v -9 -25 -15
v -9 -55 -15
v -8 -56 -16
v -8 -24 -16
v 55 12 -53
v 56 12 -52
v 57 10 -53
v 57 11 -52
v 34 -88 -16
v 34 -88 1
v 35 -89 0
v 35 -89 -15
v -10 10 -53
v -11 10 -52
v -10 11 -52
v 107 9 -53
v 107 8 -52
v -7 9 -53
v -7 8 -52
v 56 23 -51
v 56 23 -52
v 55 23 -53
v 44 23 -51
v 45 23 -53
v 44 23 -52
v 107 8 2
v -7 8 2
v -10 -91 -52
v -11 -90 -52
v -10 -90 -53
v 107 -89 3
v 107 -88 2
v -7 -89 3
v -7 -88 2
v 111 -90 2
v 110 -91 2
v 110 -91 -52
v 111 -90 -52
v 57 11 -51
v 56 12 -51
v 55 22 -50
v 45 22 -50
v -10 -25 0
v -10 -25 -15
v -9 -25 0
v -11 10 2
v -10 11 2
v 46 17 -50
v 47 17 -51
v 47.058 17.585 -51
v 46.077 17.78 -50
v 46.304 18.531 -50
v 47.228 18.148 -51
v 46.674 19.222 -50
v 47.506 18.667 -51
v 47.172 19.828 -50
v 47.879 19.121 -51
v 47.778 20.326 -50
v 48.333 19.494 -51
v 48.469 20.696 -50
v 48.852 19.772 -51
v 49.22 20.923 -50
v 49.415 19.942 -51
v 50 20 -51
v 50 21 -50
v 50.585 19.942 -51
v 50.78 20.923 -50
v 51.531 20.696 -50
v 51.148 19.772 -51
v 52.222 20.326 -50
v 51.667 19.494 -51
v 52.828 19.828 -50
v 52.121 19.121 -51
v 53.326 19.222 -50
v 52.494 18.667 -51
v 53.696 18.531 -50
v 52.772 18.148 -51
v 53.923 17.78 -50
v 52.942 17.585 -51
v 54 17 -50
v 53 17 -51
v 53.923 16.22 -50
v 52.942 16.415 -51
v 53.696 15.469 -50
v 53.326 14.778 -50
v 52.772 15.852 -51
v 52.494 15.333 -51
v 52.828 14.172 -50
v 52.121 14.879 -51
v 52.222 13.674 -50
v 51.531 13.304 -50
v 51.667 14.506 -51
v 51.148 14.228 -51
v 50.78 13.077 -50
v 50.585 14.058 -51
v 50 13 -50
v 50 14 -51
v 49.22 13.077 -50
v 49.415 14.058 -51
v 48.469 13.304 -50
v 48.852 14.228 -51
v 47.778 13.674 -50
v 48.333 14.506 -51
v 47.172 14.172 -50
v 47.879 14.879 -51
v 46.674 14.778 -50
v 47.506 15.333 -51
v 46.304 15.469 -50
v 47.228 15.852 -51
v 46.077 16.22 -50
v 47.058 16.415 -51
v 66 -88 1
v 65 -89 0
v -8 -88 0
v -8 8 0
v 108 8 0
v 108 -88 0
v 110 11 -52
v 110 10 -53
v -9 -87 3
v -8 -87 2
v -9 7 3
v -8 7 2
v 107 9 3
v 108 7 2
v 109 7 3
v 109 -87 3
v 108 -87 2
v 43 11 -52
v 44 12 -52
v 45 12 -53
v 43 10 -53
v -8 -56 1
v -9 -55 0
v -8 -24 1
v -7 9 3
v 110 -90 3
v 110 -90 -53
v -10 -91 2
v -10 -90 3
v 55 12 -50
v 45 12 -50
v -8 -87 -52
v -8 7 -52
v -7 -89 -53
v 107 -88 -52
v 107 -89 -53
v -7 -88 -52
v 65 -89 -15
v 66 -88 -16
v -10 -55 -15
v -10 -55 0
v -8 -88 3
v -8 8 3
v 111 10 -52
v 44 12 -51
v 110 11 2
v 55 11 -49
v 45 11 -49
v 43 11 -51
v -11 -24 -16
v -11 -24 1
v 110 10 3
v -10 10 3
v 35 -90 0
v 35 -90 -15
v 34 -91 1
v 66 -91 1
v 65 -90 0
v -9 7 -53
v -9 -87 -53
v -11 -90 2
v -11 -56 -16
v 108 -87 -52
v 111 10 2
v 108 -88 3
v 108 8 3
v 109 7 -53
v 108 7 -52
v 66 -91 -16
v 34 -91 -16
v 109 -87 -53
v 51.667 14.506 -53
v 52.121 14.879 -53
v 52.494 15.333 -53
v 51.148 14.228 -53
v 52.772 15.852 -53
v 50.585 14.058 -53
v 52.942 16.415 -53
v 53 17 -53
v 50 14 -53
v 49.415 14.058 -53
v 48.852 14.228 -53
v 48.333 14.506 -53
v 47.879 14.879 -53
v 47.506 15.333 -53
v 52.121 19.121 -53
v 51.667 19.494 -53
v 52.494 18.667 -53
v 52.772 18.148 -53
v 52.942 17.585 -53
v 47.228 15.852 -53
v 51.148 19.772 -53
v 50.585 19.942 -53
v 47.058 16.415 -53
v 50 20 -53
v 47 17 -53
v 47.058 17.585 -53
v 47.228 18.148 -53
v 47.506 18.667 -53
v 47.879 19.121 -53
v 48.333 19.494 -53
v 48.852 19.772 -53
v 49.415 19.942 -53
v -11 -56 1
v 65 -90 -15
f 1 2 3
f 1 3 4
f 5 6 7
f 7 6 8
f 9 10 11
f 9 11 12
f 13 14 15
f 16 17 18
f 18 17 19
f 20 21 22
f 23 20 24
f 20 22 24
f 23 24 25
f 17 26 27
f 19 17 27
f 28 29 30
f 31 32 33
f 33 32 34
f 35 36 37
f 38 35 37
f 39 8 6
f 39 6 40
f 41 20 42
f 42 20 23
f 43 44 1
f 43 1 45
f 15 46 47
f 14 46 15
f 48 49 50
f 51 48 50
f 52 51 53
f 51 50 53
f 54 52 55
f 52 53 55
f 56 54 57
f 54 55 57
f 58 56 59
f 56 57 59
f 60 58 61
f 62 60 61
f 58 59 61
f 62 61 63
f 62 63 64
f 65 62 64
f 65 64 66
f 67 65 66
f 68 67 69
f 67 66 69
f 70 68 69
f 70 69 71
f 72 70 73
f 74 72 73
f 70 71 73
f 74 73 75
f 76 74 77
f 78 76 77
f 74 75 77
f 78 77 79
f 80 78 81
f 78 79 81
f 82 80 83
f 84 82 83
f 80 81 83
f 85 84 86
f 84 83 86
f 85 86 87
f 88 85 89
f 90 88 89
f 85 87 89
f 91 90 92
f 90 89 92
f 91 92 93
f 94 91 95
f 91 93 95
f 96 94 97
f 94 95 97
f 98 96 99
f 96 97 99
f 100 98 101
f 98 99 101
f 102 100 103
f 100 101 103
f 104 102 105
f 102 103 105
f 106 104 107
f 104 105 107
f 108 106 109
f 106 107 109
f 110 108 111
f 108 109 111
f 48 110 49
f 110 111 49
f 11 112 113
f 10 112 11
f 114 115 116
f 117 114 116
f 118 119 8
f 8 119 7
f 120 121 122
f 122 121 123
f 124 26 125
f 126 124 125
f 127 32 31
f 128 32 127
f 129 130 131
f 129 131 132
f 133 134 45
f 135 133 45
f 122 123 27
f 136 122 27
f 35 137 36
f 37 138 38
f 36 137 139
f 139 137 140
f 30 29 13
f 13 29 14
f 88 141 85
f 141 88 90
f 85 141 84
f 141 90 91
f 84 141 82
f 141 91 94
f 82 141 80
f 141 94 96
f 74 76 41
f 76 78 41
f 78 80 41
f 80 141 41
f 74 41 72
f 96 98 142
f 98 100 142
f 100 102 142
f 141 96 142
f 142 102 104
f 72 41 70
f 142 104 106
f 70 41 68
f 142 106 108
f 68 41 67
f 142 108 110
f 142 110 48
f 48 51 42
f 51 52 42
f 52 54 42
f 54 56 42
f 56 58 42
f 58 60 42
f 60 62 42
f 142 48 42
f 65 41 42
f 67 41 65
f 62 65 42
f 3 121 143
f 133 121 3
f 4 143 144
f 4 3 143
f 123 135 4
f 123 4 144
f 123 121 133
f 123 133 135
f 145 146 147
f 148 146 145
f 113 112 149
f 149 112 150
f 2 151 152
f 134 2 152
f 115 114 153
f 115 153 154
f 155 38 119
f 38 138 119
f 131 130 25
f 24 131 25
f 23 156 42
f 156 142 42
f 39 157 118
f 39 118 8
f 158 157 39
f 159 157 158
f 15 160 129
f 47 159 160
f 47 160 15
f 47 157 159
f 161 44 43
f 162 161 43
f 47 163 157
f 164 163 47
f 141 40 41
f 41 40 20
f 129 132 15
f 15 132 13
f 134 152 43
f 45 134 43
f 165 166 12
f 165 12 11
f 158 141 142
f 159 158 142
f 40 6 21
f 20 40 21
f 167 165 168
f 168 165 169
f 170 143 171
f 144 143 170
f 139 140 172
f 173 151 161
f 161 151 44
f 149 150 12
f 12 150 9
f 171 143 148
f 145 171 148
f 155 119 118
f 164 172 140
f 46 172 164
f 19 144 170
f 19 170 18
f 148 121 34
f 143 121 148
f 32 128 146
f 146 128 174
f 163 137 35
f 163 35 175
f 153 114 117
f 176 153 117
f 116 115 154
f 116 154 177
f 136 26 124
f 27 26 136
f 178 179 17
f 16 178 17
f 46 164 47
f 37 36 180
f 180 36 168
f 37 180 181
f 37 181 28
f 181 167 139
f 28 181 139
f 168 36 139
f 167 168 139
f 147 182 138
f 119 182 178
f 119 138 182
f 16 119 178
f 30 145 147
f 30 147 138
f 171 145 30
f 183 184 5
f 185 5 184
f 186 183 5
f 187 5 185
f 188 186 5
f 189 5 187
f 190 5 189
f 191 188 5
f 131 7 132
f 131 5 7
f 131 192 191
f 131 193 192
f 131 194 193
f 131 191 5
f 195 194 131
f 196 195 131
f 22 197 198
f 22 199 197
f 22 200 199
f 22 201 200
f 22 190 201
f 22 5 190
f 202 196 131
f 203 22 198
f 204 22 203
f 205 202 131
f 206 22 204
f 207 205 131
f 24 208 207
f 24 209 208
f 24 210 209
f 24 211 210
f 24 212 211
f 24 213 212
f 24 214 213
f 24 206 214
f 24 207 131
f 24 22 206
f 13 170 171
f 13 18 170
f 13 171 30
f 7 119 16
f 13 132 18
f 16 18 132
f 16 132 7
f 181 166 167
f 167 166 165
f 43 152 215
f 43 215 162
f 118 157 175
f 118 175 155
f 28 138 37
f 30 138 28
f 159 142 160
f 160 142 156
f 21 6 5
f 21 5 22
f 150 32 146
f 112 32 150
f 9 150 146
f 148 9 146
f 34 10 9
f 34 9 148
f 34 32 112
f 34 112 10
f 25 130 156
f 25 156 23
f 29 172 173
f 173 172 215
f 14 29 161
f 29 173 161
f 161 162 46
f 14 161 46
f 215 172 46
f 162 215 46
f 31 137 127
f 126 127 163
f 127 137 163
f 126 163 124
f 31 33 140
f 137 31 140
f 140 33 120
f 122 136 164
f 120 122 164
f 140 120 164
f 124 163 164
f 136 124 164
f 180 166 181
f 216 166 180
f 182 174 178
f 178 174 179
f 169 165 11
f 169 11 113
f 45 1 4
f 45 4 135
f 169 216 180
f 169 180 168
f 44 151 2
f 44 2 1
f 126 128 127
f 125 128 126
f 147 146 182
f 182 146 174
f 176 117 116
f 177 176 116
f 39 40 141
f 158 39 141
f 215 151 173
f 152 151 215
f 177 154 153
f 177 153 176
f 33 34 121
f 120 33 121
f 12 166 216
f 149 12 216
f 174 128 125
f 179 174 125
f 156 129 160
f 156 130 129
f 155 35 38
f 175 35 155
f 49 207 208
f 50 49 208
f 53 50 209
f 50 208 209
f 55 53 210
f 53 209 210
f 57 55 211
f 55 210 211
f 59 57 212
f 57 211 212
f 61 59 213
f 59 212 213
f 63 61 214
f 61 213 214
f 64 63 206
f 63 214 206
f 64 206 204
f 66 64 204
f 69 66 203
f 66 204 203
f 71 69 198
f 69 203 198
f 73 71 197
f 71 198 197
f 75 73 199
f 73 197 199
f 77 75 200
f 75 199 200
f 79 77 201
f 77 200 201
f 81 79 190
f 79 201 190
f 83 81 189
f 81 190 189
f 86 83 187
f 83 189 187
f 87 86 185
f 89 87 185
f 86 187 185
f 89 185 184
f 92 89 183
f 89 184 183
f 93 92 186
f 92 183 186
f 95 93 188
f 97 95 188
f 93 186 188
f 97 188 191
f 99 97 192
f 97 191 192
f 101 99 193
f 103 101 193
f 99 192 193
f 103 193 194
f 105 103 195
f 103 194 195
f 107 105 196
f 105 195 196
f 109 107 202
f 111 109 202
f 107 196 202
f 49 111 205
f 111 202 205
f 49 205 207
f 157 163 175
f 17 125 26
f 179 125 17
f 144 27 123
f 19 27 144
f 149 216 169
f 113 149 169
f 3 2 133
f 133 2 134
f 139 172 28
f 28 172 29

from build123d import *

# Parameters (mm, degrees)
SKETCH_1_W          = 116
SKETCH_1_H          = 96
EXTRUDE_1_DEPTH     = 3
EXTRUDE_START       = -3
SKETCH_2_W          = 122
SKETCH_2_H          = 102
SKETCH_2_W_2        = 116
SKETCH_2_H_2        = 96
EXTRUDE_2_DEPTH     = 56
SKETCH_3_W          = 30
SKETCH_3_H          = 15
CUT_EXTRUDE_1_DEPTH = 8
SKETCH_4_W          = 15
SKETCH_4_H          = 30
CUT_EXTRUDE_2_DEPTH = 3
SKETCH_5_W          = 12
SKETCH_5_H          = 12
SKETCH_5_R          = 3
EXTRUDE_6_DEPTH     = 3
CHAMFER_3_SIZE      = 1


with BuildPart() as part:
    # 草图1 → 凸台-拉伸1 (new body)
    with BuildSketch(Plane.XY):
        with Locations((50, -40)):
            Rectangle(SKETCH_1_W, SKETCH_1_H)
    extrude(amount=EXTRUDE_1_DEPTH)


with BuildPart() as body_2:
    # 草图2 → 凸台-拉伸2 (new body)
    with BuildSketch(Plane(origin=(0, 0, 0), x_dir=(-1, 0, 0), z_dir=(0, 0, -1)).offset(EXTRUDE_START)):
        with Locations((-50, -40)):
            Rectangle(SKETCH_2_W, SKETCH_2_H)
        with Locations((-50, -40)):
            Rectangle(SKETCH_2_W_2, SKETCH_2_H_2, mode=Mode.SUBTRACT)
    extrude(amount=EXTRUDE_2_DEPTH)

    # 草图3 → 切除-拉伸1 (cut)
    with BuildSketch(Plane.XZ.offset(91)):
        with Locations((50, -7.5)):
            Rectangle(SKETCH_3_W, SKETCH_3_H)
    extrude(amount=-CUT_EXTRUDE_1_DEPTH, mode=Mode.SUBTRACT)

    # 草图4 → 切除-拉伸2 (cut)
    with BuildSketch(Plane.ZY.offset(11)):
        with Locations((-7.5, -40)):
            Rectangle(SKETCH_4_W, SKETCH_4_H)
    extrude(amount=-CUT_EXTRUDE_2_DEPTH, mode=Mode.SUBTRACT)

    # 草图5 → 凸台-拉伸6 (add)
    with BuildSketch(Plane(origin=(0, 0, -53), x_dir=(-1, 0, 0), z_dir=(0, 0, -1))):
        with Locations((-50, 17)):
            Rectangle(SKETCH_5_W, SKETCH_5_H)
        with Locations((-50, 17)):
            Circle(SKETCH_5_R, mode=Mode.SUBTRACT)
    extrude(amount=-EXTRUDE_6_DEPTH)

    # 倒角3
    chamfer_3_edges = [body_2.edges().sort_by_distance(p)[0] for p in [
        (-11, -40, 3),
        (50, -91, 3),
        (111, -40, 3),
        (50, 11, 3),
        (-11, -40, -53),
        (50, -88, 3),
        (-11, -91, -25),
        (-8, -40, 3),
        (50, 8, 3),
        (108, -40, 3),
        (83.5, 11, -53),
        (-11, 11, -25),
        (111, -40, -53),
        (111, 11, -25),
        (50, -91, -53),
        (111, -91, -25),
        (50, -88, -15),
        (65, -88, -7.5),
        (-8, 8, -25),
        (50, -88, 0),
        (35, -88, -7.5),
        (108, 8, -25),
        (108, -88, -25),
        (-8, -88, -25),
        (-8, -40, -53),
        (50, -88, -53),
        (35, -91, -7.5),
        (50, -91, -15),
        (108, -40, -53),
        (65, -91, -7.5),
        (50, -91, 0),
        (50, 8, -53),
        (-8, -40, 0),
        (-8, -55, -7.5),
        (-8, -40, -15),
        (-8, -25, -7.5),
        (-11, -40, 0),
        (-11, -25, -7.5),
        (-11, -40, -15),
        (-11, -55, -7.5),
        (16.5, 11, -53),
        (44, 17, -50),
        (50, 11, -50),
        (44, 11, -51.5),
        (56, 17, -50),
        (56, 11, -51.5),
        (50, 23, -50),
        (53, 17, -50),
        (44, 17, -53),
        (56, 17, -53),
    ]]
    chamfer(chamfer_3_edges, length=CHAMFER_3_SIZE)


solid = Compound([part.part, body_2.part])
